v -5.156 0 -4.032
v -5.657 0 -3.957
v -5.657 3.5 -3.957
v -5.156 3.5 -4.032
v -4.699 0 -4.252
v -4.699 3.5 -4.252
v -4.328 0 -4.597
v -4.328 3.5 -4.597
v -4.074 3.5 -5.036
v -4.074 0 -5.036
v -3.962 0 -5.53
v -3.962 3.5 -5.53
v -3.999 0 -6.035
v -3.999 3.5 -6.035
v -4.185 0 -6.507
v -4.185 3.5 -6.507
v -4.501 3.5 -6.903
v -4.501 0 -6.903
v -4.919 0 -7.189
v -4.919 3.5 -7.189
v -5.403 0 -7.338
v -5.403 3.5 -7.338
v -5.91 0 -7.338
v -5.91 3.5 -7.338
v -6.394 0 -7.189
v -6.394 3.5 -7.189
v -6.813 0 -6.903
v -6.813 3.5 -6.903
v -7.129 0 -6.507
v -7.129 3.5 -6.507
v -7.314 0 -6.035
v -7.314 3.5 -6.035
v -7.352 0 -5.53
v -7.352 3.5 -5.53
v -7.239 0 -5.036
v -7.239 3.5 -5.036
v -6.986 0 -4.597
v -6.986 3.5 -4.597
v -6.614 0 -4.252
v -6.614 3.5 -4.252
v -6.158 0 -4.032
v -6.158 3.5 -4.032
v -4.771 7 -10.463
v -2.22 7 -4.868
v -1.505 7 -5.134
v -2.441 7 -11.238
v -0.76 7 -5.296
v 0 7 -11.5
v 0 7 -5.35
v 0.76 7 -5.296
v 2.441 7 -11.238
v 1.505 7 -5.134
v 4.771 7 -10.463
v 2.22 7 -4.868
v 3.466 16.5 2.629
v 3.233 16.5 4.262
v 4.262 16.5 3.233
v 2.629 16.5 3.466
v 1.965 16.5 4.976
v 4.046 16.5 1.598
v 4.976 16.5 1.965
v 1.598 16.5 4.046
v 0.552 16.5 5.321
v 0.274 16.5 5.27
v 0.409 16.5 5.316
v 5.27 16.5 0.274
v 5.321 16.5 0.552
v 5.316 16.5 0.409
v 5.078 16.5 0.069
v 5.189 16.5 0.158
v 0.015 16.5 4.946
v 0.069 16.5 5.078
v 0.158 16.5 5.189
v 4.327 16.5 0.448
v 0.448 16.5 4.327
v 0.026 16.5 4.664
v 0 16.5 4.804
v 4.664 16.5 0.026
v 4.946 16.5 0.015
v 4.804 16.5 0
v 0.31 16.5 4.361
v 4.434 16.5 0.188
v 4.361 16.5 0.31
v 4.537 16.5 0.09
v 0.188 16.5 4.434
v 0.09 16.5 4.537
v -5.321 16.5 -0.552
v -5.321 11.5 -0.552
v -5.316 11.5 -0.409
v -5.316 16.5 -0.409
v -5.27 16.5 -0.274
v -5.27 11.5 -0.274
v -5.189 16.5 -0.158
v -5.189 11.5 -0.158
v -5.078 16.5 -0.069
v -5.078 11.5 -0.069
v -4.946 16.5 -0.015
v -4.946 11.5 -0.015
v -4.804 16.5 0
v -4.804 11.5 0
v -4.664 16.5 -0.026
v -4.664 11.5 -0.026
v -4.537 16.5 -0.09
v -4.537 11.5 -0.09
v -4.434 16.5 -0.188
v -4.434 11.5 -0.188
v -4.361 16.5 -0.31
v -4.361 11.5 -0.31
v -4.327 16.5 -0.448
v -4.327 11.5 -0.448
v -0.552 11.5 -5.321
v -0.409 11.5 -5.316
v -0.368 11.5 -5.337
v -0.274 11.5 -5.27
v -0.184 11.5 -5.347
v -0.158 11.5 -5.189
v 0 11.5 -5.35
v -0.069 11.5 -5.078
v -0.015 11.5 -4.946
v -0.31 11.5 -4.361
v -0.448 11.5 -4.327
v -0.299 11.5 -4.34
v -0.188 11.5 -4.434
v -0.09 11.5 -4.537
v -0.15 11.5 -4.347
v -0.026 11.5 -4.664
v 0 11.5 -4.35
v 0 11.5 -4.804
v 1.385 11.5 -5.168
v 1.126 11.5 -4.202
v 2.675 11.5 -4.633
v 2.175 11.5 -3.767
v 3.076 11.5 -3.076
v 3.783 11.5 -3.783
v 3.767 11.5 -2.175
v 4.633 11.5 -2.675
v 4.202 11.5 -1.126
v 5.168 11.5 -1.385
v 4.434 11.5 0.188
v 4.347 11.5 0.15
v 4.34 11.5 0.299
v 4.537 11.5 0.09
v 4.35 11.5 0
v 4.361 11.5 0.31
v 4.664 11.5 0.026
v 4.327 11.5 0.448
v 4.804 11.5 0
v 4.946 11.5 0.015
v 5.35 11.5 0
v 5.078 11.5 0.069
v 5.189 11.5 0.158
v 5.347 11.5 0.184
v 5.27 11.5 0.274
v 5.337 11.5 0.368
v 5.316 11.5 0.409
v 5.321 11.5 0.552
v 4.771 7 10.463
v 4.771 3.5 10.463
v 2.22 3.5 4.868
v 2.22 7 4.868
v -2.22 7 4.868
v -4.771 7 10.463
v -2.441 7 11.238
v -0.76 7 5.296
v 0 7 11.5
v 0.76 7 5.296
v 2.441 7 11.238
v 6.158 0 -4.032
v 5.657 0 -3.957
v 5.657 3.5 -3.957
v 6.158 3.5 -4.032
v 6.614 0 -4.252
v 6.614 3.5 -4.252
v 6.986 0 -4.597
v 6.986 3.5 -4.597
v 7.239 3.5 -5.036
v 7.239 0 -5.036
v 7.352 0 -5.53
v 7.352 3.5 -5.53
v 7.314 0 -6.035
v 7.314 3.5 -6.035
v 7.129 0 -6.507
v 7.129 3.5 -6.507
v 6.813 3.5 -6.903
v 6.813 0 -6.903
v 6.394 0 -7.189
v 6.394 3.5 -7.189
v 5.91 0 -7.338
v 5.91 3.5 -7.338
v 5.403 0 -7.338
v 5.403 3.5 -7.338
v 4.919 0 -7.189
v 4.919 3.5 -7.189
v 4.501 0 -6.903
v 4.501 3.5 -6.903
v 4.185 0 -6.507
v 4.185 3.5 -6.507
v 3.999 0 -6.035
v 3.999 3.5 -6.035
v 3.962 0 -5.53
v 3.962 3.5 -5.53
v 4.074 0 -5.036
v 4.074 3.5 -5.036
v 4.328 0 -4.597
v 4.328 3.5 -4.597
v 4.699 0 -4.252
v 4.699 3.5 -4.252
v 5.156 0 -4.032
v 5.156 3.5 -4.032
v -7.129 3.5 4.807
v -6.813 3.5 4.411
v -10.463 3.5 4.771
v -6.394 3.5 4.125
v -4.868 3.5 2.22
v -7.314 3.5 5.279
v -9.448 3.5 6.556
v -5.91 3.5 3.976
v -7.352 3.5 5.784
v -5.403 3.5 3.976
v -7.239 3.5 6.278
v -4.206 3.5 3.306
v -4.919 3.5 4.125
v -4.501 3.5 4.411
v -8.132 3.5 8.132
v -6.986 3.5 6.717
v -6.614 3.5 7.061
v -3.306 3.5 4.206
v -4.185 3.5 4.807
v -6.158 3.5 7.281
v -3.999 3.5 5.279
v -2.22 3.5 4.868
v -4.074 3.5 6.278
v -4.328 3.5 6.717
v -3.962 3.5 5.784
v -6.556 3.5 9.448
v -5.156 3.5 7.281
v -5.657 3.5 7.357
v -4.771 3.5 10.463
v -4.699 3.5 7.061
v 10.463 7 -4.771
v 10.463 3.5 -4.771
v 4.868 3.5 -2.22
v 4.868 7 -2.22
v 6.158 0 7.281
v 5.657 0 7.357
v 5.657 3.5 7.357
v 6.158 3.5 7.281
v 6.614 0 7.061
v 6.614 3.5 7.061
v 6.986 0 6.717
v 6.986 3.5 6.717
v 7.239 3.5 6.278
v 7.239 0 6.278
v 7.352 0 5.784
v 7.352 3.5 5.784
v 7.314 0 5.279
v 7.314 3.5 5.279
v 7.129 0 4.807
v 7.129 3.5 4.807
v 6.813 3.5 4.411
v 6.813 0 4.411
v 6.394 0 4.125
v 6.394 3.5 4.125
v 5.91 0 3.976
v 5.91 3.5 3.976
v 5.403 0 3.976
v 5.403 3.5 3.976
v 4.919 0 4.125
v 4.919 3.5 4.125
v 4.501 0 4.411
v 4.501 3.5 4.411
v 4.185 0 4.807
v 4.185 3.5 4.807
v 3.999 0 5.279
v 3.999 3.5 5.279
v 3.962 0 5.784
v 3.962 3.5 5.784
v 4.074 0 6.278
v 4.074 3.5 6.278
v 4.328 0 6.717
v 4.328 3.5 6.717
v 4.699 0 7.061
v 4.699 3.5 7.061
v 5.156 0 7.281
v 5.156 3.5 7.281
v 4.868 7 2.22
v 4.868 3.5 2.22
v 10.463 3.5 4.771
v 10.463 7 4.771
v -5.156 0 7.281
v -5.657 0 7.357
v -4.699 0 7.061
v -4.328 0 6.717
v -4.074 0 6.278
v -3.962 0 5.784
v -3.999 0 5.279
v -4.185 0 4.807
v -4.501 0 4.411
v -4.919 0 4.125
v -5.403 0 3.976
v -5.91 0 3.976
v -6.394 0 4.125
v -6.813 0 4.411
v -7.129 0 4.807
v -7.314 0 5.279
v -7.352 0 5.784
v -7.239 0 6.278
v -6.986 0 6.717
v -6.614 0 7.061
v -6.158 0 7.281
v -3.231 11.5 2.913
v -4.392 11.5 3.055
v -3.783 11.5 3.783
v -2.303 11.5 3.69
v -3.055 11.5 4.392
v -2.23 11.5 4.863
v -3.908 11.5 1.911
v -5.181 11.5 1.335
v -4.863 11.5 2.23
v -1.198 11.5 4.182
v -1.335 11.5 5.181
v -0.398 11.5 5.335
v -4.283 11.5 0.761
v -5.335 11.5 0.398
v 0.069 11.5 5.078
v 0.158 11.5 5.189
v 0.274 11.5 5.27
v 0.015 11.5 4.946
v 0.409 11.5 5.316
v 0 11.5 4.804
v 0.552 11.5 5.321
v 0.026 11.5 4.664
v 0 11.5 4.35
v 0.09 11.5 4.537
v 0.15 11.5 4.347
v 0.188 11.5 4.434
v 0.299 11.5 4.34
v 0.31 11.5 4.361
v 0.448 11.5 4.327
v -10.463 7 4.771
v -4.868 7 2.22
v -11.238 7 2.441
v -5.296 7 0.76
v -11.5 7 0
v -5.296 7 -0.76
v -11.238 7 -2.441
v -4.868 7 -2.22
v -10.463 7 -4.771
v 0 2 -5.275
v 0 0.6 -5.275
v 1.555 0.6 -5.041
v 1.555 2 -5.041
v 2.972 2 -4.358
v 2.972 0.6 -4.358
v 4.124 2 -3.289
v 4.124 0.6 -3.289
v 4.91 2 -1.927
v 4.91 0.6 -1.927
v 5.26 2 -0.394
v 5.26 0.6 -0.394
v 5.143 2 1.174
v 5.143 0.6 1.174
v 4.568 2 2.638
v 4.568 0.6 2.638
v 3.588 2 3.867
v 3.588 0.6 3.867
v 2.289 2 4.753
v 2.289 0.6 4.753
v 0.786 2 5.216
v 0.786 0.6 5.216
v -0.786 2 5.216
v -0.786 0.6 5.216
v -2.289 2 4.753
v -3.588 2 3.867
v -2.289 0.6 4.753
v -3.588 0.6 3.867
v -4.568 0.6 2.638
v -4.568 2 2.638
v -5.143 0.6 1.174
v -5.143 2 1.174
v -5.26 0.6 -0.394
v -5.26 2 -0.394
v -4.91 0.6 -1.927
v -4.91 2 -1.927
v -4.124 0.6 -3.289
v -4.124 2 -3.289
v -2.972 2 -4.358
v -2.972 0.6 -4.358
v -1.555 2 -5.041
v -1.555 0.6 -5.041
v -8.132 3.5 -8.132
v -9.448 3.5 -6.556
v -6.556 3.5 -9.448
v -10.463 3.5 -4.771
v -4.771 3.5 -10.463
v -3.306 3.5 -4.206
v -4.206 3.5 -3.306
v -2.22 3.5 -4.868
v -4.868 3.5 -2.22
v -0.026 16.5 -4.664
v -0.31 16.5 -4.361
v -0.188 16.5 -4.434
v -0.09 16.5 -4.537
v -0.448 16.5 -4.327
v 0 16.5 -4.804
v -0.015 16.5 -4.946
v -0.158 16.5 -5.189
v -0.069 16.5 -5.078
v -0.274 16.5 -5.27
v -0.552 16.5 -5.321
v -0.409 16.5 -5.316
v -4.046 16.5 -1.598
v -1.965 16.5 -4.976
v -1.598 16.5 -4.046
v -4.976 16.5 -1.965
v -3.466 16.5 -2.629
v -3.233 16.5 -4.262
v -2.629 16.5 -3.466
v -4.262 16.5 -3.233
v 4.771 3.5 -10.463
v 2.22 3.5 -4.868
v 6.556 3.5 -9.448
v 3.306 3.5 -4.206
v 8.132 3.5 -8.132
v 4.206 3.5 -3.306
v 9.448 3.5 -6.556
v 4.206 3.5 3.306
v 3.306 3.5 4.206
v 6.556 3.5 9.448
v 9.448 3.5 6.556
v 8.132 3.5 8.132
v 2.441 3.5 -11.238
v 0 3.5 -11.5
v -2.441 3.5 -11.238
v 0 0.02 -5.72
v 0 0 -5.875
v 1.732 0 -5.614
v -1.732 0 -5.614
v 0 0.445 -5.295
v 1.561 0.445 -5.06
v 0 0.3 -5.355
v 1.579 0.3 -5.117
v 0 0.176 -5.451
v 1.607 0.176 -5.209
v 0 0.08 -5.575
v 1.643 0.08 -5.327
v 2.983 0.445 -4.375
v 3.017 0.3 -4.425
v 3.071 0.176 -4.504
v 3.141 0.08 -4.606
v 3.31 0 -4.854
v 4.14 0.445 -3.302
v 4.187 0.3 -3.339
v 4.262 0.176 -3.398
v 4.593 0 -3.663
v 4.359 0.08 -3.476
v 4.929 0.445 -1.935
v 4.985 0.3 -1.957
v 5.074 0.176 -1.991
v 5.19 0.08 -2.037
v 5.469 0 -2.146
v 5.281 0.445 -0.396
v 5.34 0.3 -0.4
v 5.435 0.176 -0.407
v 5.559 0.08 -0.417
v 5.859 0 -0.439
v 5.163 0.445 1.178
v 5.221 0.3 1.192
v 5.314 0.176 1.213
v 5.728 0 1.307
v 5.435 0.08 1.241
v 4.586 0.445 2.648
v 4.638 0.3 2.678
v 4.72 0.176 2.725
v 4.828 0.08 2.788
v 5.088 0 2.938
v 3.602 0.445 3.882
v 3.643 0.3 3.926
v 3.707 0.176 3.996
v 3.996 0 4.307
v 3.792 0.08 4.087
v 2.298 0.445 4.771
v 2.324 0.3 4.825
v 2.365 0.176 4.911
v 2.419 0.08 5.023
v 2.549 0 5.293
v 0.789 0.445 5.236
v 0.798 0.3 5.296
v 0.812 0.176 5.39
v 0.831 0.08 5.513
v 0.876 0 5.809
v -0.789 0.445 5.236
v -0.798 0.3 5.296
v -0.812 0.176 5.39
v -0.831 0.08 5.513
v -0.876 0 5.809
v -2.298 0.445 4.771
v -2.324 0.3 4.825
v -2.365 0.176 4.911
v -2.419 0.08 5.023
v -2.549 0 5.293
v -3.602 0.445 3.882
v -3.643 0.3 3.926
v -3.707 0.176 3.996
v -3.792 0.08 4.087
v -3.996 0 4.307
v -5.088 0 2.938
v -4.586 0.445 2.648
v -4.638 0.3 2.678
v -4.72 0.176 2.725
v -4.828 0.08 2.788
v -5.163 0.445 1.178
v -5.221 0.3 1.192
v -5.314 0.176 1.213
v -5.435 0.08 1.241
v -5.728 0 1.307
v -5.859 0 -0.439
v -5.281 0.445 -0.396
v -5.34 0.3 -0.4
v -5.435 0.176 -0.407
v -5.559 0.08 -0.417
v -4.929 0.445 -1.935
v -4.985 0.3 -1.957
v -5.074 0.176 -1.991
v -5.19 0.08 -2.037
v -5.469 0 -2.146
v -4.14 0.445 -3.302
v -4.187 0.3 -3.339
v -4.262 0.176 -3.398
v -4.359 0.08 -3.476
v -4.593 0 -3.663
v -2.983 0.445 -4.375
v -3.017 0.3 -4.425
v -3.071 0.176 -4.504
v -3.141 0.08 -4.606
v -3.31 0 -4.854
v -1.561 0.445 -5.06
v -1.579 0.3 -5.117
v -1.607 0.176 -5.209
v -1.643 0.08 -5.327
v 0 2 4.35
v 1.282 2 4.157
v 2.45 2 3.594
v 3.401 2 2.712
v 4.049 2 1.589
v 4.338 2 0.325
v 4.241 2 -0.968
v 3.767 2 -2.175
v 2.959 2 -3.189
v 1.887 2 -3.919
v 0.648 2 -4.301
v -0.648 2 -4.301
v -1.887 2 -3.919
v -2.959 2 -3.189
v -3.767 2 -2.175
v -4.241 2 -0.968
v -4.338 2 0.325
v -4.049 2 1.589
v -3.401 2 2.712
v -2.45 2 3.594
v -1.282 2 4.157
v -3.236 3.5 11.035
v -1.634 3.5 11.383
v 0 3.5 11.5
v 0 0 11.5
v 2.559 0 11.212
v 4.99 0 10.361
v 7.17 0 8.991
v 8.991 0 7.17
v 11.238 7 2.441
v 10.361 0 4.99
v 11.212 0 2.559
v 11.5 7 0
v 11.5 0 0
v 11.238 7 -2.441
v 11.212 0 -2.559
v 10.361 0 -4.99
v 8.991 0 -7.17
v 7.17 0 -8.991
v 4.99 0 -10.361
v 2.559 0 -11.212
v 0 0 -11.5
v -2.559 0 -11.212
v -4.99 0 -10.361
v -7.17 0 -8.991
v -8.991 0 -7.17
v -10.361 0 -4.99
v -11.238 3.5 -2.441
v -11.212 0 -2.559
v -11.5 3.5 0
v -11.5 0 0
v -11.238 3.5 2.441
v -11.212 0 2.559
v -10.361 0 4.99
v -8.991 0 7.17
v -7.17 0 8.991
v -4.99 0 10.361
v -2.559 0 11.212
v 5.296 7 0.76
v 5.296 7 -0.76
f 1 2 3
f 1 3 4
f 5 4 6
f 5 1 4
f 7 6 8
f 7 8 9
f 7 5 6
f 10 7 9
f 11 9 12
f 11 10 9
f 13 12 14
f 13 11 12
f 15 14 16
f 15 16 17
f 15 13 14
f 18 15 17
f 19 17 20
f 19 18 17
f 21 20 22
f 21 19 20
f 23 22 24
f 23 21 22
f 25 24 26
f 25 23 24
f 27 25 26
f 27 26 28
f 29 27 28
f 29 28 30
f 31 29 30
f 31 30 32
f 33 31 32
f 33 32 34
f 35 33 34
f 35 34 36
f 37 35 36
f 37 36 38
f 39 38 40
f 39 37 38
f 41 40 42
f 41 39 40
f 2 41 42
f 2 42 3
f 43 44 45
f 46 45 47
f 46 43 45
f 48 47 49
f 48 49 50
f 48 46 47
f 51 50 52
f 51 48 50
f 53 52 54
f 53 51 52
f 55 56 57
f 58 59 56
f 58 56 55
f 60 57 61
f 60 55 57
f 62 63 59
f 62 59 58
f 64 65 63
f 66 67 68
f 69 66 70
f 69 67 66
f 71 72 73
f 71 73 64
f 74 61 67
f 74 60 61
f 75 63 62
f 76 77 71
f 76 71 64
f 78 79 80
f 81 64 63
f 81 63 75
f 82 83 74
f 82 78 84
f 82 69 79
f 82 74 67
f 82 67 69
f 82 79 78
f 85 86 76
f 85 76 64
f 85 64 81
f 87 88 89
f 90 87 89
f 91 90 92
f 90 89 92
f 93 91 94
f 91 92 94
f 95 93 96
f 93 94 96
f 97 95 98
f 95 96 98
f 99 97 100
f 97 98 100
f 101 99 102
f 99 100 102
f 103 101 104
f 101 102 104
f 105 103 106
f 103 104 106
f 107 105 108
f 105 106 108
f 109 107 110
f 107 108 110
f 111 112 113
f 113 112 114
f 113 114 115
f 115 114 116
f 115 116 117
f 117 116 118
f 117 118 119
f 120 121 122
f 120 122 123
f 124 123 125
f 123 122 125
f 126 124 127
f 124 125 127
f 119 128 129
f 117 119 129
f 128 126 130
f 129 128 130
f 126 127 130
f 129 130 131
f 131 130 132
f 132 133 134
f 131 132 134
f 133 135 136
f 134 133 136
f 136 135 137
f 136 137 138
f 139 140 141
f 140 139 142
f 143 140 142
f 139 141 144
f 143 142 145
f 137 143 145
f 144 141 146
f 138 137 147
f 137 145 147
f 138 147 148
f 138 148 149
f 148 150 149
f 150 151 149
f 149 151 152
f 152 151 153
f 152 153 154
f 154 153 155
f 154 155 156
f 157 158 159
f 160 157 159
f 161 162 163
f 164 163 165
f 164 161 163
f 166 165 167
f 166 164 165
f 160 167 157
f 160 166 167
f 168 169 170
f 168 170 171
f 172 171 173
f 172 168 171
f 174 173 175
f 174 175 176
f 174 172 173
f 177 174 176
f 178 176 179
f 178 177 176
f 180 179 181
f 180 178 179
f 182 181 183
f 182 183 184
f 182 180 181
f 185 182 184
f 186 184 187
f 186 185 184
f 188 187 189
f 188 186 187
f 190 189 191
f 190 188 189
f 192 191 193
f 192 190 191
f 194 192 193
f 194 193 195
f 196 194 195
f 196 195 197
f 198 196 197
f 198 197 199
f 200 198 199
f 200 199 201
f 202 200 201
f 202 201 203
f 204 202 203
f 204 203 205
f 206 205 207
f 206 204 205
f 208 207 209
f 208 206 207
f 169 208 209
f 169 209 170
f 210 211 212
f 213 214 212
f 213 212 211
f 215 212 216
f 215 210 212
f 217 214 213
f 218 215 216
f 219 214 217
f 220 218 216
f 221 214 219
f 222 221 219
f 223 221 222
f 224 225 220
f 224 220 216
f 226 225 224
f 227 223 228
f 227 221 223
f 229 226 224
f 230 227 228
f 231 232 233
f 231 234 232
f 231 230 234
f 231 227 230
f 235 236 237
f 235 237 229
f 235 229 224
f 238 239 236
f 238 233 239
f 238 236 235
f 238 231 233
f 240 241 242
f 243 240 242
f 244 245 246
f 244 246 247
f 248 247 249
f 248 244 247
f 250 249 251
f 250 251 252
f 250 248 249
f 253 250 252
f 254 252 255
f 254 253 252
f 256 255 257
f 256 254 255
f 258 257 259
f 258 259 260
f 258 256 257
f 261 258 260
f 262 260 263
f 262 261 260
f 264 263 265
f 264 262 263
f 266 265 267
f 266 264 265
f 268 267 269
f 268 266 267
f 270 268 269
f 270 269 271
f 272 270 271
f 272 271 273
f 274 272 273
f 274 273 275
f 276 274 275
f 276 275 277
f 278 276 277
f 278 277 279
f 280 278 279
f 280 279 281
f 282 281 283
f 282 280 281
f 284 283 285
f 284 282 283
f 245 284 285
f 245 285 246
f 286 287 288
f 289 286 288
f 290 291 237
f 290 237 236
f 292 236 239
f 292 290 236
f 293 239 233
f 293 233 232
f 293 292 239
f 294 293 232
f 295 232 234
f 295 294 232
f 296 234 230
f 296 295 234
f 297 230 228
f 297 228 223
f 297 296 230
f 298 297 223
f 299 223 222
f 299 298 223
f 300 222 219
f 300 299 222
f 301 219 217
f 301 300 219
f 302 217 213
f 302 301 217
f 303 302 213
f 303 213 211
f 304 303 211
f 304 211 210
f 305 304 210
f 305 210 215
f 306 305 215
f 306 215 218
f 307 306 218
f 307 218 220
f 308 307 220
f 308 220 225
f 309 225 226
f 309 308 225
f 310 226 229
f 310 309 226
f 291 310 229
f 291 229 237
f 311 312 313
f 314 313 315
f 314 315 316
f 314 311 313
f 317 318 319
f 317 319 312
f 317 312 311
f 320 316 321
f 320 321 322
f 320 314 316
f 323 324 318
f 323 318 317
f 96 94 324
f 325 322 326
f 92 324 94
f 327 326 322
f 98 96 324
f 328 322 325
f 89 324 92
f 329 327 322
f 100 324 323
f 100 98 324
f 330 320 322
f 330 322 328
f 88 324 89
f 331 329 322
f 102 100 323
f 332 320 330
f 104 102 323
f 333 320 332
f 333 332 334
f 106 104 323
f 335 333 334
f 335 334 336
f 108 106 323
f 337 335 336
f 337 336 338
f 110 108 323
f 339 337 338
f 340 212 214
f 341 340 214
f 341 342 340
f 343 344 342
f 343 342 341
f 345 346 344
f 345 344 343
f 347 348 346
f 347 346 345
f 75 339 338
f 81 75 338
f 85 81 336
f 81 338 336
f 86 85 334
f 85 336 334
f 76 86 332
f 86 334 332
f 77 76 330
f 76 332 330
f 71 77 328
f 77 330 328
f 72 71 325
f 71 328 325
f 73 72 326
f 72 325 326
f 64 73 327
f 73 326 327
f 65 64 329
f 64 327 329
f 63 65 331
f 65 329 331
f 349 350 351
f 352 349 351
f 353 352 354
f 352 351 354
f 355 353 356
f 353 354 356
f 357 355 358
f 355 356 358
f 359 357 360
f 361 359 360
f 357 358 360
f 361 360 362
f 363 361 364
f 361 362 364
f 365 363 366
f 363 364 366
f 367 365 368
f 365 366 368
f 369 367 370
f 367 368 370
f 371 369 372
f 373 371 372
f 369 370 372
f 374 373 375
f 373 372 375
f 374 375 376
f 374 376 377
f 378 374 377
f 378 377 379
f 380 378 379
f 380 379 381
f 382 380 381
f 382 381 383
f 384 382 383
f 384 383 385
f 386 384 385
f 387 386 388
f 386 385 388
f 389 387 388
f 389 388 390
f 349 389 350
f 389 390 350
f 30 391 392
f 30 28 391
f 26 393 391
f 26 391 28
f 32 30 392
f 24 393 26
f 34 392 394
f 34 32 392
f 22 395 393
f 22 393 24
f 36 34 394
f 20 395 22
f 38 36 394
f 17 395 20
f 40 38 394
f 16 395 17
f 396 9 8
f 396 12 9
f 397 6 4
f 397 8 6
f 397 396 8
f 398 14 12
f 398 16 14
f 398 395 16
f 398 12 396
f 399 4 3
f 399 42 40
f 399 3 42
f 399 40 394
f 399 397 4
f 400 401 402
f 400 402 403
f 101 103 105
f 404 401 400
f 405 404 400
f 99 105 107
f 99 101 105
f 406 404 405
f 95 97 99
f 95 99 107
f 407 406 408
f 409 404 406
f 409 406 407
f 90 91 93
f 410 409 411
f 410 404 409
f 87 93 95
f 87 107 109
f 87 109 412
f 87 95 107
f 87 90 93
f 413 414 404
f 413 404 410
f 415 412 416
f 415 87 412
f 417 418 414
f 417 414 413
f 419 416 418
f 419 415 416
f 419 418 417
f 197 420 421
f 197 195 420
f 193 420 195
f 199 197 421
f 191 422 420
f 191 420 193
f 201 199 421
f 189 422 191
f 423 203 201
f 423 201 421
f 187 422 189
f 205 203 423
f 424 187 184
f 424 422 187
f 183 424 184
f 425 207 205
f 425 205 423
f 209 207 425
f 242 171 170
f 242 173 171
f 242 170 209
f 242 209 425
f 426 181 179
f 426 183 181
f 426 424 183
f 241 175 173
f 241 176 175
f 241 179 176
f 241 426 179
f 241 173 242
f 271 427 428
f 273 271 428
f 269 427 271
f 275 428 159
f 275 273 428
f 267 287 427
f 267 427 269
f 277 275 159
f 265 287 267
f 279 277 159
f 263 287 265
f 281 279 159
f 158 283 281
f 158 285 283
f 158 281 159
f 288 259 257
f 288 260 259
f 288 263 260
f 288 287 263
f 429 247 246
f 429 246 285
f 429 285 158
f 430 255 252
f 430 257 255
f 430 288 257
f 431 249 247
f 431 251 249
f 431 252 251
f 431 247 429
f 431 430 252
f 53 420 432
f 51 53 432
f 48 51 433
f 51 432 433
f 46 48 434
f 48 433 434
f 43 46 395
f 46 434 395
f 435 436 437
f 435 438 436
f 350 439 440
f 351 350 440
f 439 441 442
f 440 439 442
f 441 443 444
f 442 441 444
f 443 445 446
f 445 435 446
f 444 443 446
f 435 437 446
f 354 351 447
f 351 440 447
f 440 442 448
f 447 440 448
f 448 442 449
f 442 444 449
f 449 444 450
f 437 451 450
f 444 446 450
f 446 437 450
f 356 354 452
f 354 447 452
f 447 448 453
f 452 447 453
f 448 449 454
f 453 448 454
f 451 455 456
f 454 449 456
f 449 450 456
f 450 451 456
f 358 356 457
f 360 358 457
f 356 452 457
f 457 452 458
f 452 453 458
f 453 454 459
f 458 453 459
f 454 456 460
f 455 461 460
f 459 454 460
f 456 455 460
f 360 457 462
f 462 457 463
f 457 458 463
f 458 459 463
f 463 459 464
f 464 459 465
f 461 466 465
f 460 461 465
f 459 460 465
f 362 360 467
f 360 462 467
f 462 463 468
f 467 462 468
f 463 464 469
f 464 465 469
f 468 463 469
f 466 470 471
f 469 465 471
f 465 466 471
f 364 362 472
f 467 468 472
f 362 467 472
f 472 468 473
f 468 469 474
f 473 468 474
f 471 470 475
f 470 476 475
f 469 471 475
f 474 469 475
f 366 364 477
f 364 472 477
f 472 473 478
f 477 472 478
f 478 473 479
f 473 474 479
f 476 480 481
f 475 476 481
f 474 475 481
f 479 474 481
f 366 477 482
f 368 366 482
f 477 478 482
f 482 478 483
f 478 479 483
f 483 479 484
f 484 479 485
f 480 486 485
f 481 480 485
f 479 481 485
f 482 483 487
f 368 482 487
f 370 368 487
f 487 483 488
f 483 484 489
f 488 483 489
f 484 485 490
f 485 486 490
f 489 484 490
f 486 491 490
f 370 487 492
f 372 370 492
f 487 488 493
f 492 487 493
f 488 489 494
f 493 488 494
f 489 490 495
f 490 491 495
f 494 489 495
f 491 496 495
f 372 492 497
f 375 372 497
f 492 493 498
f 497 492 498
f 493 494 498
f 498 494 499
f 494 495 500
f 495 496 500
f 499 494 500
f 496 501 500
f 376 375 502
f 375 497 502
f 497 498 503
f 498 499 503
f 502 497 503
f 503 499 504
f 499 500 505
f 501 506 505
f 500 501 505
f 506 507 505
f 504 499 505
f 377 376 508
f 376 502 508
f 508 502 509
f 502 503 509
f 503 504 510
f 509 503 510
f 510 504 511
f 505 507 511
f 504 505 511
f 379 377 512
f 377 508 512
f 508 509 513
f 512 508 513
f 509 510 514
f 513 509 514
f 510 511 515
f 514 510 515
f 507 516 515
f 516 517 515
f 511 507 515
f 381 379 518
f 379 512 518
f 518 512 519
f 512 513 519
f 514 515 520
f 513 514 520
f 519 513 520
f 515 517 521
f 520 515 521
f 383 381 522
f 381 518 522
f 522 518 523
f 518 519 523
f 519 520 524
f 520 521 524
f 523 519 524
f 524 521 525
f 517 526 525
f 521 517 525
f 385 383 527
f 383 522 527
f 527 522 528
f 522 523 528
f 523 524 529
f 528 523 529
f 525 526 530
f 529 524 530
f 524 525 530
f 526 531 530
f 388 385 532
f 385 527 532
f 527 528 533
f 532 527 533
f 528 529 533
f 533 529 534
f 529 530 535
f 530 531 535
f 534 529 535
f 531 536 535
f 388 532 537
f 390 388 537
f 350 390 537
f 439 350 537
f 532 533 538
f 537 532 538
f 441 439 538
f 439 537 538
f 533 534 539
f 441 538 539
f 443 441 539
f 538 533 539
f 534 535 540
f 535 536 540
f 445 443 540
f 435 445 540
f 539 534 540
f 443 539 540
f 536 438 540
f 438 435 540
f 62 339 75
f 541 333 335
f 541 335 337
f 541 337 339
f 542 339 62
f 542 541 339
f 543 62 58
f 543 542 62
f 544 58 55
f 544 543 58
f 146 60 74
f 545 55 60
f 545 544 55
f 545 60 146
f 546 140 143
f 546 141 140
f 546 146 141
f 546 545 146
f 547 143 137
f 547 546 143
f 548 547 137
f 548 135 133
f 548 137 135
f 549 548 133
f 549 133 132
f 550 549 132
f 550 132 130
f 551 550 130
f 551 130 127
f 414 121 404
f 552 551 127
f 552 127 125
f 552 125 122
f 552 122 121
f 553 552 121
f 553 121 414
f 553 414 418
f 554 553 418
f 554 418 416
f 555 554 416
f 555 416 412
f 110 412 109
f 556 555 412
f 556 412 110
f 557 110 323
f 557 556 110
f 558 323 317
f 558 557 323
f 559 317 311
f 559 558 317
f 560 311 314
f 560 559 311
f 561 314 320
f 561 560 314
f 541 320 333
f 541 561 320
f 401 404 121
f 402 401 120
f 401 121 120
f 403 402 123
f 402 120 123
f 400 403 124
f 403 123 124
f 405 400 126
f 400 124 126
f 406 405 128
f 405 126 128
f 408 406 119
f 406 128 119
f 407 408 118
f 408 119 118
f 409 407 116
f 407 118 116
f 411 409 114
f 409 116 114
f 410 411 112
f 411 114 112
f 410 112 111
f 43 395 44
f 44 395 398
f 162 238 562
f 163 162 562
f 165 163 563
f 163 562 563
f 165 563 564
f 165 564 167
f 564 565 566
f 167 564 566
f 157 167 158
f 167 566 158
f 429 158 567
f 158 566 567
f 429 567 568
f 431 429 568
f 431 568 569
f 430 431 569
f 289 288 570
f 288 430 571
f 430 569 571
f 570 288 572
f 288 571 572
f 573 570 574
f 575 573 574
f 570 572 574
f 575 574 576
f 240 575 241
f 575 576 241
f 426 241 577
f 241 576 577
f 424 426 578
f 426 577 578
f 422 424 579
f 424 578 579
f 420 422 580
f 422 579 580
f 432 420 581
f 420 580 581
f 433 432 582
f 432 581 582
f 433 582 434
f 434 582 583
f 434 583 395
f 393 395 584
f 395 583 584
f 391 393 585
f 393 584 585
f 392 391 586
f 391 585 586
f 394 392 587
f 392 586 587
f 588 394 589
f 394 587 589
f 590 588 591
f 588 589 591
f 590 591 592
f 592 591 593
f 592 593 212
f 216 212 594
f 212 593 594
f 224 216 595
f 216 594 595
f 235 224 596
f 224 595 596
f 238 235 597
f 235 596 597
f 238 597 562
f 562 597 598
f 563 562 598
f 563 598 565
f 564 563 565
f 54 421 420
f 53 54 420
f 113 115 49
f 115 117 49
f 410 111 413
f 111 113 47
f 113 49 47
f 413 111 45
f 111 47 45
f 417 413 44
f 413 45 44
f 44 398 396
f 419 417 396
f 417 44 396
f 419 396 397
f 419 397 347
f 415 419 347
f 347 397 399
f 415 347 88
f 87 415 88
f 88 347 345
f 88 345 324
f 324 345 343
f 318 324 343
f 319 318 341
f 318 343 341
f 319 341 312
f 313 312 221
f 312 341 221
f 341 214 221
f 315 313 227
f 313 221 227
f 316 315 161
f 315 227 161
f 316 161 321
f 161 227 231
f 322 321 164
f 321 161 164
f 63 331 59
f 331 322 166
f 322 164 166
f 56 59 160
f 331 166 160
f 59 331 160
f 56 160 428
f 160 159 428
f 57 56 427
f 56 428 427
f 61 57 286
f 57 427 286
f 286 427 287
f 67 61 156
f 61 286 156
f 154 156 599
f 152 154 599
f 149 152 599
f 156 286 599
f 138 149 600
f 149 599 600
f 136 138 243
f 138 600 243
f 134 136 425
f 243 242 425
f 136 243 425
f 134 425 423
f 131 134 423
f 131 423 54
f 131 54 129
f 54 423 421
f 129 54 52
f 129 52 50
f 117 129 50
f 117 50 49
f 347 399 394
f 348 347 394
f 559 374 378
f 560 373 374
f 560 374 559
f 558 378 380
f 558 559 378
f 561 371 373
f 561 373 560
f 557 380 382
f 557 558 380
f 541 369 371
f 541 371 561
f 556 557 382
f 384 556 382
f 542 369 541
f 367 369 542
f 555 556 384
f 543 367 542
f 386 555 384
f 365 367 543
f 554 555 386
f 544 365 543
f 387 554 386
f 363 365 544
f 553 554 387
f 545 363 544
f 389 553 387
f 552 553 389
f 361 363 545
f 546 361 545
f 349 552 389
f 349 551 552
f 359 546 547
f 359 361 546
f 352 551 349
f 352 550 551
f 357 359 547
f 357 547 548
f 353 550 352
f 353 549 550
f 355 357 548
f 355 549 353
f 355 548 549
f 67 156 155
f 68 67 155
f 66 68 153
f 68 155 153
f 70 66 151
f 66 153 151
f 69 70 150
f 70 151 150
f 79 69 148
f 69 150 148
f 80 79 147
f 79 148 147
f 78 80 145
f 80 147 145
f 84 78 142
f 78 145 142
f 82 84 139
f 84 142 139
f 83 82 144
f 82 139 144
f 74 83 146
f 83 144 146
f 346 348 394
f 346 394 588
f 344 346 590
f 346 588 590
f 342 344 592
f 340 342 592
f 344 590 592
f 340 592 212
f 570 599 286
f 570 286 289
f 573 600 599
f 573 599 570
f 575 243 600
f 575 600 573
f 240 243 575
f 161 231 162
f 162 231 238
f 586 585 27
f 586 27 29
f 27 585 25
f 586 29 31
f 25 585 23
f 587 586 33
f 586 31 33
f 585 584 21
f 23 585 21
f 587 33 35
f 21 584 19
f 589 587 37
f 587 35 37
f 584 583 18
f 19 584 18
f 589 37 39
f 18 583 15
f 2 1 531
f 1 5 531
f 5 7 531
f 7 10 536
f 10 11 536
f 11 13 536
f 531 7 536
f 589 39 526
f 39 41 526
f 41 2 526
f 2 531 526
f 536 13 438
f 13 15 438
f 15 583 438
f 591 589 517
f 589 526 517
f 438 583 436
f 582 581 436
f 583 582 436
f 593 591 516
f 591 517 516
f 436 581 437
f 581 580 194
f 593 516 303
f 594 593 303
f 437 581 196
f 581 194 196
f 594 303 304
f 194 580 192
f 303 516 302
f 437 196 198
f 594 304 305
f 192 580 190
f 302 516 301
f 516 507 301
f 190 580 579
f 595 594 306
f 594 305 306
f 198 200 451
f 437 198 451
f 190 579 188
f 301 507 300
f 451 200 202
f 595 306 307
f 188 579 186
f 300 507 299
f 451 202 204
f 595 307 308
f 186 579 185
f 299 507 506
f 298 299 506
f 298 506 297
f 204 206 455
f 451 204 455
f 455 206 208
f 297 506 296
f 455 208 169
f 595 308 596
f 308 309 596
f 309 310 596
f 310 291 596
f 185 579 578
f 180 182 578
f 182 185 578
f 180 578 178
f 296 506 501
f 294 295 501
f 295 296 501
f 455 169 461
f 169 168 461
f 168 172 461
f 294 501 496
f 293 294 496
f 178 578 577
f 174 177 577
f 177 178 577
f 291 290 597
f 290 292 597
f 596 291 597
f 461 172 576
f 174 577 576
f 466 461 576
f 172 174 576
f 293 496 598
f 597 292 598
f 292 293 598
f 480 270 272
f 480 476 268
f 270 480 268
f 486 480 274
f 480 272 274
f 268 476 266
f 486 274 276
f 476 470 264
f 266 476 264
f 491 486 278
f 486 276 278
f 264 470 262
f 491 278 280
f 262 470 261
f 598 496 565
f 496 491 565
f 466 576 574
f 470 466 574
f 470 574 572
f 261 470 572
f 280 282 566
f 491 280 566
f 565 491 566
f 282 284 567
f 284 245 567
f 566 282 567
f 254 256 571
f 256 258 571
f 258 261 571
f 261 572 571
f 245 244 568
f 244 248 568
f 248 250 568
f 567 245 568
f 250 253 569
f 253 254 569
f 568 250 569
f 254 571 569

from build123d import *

# Parameters (mm, degrees)
CROQUIS1_R              = 11.5
CROQUIS1_R_2            = 4.35
CROQUIS1_R_3            = 1.7000000000000004
SALIENTE_EXTRUIR1_DEPTH = 3.5
CROQUIS2_R              = 5.35
CROQUIS2_R_2            = 4.35
SALIENTE_EXTRUIR2_DEPTH = 13
CORTAR_EXTRUIR1_START   = -5
CORTAR_EXTRUIR1_DEPTH   = 5
CROQUIS4_R              = 5.275
CROQUIS4_R_2            = 4.35
CORTAR_EXTRUIR2_DEPTH   = 2
REDONDEO1_R             = 0.6
REDONDEO2_R             = 0.5
SALIENTE_EXTRUIR3_DEPTH = 3.5


with BuildPart() as part:
    # Croquis1 → Saliente-Extruir1 (new body)
    with BuildSketch(Plane(origin=(0, 0, 0), x_dir=(1, 0, 0), z_dir=(0, 1, 0))):
        with Locations(Location((1.731948e-11, 0, 0), (0, 0, 270))):
            Circle(CROQUIS1_R)
        with Locations(Location((1.731948e-11, 0, 0), (0, 0, 270))):
            Circle(CROQUIS1_R_2, mode=Mode.SUBTRACT)
        with Locations(Location((5.656854249492441, 5.65685424949238, 0), (0, 0, 270))):
            Circle(CROQUIS1_R_3, mode=Mode.SUBTRACT)
        with Locations(Location((-5.656854249492318, 5.656854249492381, 0), (0, 0, 270))):
            Circle(CROQUIS1_R_3, mode=Mode.SUBTRACT)
        with Locations(Location((-5.656854249492318, -5.656854249492381, 0), (0, 0, 270))):
            Circle(CROQUIS1_R_3, mode=Mode.SUBTRACT)
        with Locations(Location((5.656854249492441, -5.65685424949238, 0), (0, 0, 270))):
            Circle(CROQUIS1_R_3, mode=Mode.SUBTRACT)
    extrude(amount=SALIENTE_EXTRUIR1_DEPTH)

    # Croquis2 → Saliente-Extruir2 (add)
    with BuildSketch(Plane(origin=(0, 3.5, 0), x_dir=(1, 0, 0), z_dir=(0, 1, 0))):
        with Locations(Location((1.731948e-11, 0, 0), (0, 0, 90))):
            Circle(CROQUIS2_R)
        with Locations(Location((1.731948e-11, 0, 0), (0, 0, 270))):
            Circle(CROQUIS2_R_2, mode=Mode.SUBTRACT)
    extrude(amount=SALIENTE_EXTRUIR2_DEPTH)

    # Croquis3 → Cortar-Extruir1 (cut)
    with BuildSketch(Plane(origin=(0, 16.5, 0), x_dir=(1, 0, 0), z_dir=(0, 1, 0)).offset(CORTAR_EXTRUIR1_START)):
        with BuildLine():
            Line((1.732086e-11, 5.35), (1.732072e-11, 4.35))
            ThreePointArc((1.732072e-11, 4.35), (3.0759144981543076, 3.0759144981369877), (4.34999999998268, 0))
            Line((4.34999999998268, 0), (5.34999999998268, 0))
            ThreePointArc((5.34999999998268, 0), (3.783021279340855, 3.783021279323535), (1.732086e-11, 5.35))
        make_face()
        with BuildLine():
            Line((1.732086e-11, -5.35), (1.732072e-11, -4.35))
            ThreePointArc((1.732072e-11, -4.35), (-3.075914498144163, -3.075914498161481), (-4.34999999998268, 0))
            Line((-4.34999999998268, 0), (-5.34999999998268, 0))
            ThreePointArc((-5.34999999998268, 0), (-3.7830212793307103, -3.7830212793480285), (1.732086e-11, -5.35))
        make_face()
    extrude(amount=CORTAR_EXTRUIR1_DEPTH, mode=Mode.SUBTRACT)

    # Croquis4 → Cortar-Extruir2 (cut)
    with BuildSketch(Plane.XZ):
        with Locations(Location((1.731948e-11, 0, 0), (0, 0, 270))):
            Circle(CROQUIS4_R)
        with Locations(Location((1.731948e-11, 0, 0), (0, 0, 270))):
            Circle(CROQUIS4_R_2, mode=Mode.SUBTRACT)
    extrude(amount=-CORTAR_EXTRUIR2_DEPTH, mode=Mode.SUBTRACT)

    # Redondeo1
    redondeo1_edges = [part.edges().sort_by_distance(p)[0] for p in [
        (1.732109e-11, 0, 5.275),
    ]]
    fillet(redondeo1_edges, radius=REDONDEO1_R)

    # Redondeo2
    # the kernel refuses this fillet: 0.5 mm, written as the material it takes off along each edge
    with BuildSketch(Plane(origin=(-4.34999999998268, 11.5, -2.1e-16), x_dir=(0.05161519234821224, 0, -0.9986670475783493), z_dir=(0, 1, 0))) as redondeo2_piece_1:
        with BuildLine():
            CenterArc((0.4748597696035476, 0.49933352378917434), REDONDEO2_R, 182.9586473758917, 84.08270524821648)
            Line((-0.02447375418562714, 0.4735259276150691), (0, 0))
            ThreePointArc((0, 0), (0.22452608671472166, 0.00579834303418057), (0.44905217342944187, 0))
        make_face()
    extrude(amount=6.185394894032285, mode=Mode.SUBTRACT)
    with BuildSketch(Plane(origin=(-5.34999999998268, 11.5, 0), x_dir=(1, 0, 0), z_dir=(0, 1, 0))) as redondeo2_piece_2:
        with BuildLine():
            CenterArc((0.5258420423870858, 0.5), REDONDEO2_R, 174.0827052482164, 95.91729475178363)
            ThreePointArc((0.02850617046822901, 0.5515463917525775), (0.00713129545583069, 0.2761412790629337), (0, 0))
            Line((0, 0), (0.5258420423870858, 0))
        make_face()
    extrude(amount=6.380706395314668, mode=Mode.SUBTRACT)
    with BuildSketch(Plane(origin=(1.7321e-11, 11.5, 5.35), x_dir=(-3.5e-16, 0, -1), z_dir=(0, 1, 0))) as redondeo2_piece_3:
        with BuildLine():
            CenterArc((0.5258420423870855, -0.5), REDONDEO2_R, 89.99999999999997, 95.91729475178352)
            ThreePointArc((0.02850617046822881, -0.5515463917525766), (0.00713129545583059, -0.27614127906293173), (0, 0))
            Line((0, 0), (0.5258420423870858, 0))
        make_face()
    extrude(amount=6.3807063953146645, mode=Mode.SUBTRACT)
    with BuildSketch(Plane(origin=(1.731868e-11, 11.5, 4.35), x_dir=(0.9986670475783493, 0, -0.051615192348211894), z_dir=(0, 1, 0))) as redondeo2_piece_4:
        with BuildLine():
            CenterArc((0.474859769603551, -0.49933352378917434), REDONDEO2_R, 92.95864737589183, 84.08270524821639)
            Line((-0.0244737541856237, -0.4735259276150684), (0, 0))
            ThreePointArc((0, 0), (0.2245260867147224, -0.00579834303418053), (0.4490521734294448, 0))
        make_face()
    extrude(amount=6.185394894032285, mode=Mode.SUBTRACT)
    with BuildSketch(Plane(origin=(1.732072e-11, 11.5, -4.35), x_dir=(-0.9986670475783493, 0, 0.05161519234821218), z_dir=(0, 1, 0))) as redondeo2_piece_5:
        with BuildLine():
            CenterArc((0.474859769603548, -0.49933352378917434), REDONDEO2_R, 92.95864737589177, 84.08270524821641)
            Line((-0.02447375418562666, -0.47352592761506823), (0, 0))
            ThreePointArc((0, 0), (0.22452608671472019, -0.00579834303418048), (0.4490521734294423, 0))
        make_face()
    extrude(amount=6.185394894032285, mode=Mode.SUBTRACT)
    with BuildSketch(Plane(origin=(1.731981e-11, 11.5, -5.35), x_dir=(1.91e-15, 0, 1), z_dir=(0, 1, 0))) as redondeo2_piece_6:
        with BuildLine():
            CenterArc((0.5258420423870848, -0.5), REDONDEO2_R, 89.99999999999989, 95.91729475178357)
            ThreePointArc((0.02850617046822795, -0.5515463917525762), (0.00713129545583016, -0.2761412790629328), (0, 0))
            Line((0, 0), (0.5258420423870858, 0))
        make_face()
    extrude(amount=6.3807063953146645, mode=Mode.SUBTRACT)
    with BuildSketch(Plane(origin=(4.34999999998268, 11.5, 1.9e-16), x_dir=(-0.05161519227127975, 0, 0.9986670475823255), z_dir=(0, 1, 0))) as redondeo2_piece_7:
        with BuildLine():
            CenterArc((0.47485976964022647, 0.4993335237871862), REDONDEO2_R, 182.95864737147792, 84.08270524821648)
            Line((-0.02447375415093636, 0.4735259276515472), (0, 0))
            ThreePointArc((0, 0), (0.22452608671427532, 0.00579834305147695), (0.44905217342765447, 0))
        make_face()
    extrude(amount=6.1853948941188825, mode=Mode.SUBTRACT)
    with BuildSketch(Plane(origin=(5.34999999998268, 11.5, 0), x_dir=(-1, 0, 0), z_dir=(0, 1, 0))) as redondeo2_piece_8:
        with BuildLine():
            CenterArc((0.5258420423524468, 0.5), REDONDEO2_R, 174.08270524821663, 95.9172947517834)
            ThreePointArc((0.02850617043358916, 0.5515463917525757), (0.00713129542123792, 0.2761412790638253), (0, 0))
            Line((0, 0), (0.5258420423524468, 0))
        make_face()
    extrude(amount=6.380706395310192, mode=Mode.SUBTRACT)

    # Croquis5 → Saliente-Extruir3 (add)
    with BuildSketch(Plane(origin=(0, 3.5, 0), x_dir=(1, 0, 0), z_dir=(0, 1, 0))):
        with BuildLine():
            Line((-4.867801495370659, 2.219686599837588), (-10.46349854147086, 4.7712889529219185))
            ThreePointArc((-10.46349854147086, 4.7712889529219185), (-11.49999999998268, 1.41e-15), (-10.46349854147086, -4.771288952921916))
            Line((-10.46349854147086, -4.771288952921914), (-4.86780149537066, -2.219686599837586))
            ThreePointArc((-4.86780149537066, -2.219686599837586), (-5.34999999998268, 8.9e-16), (-4.86780149537066, 2.219686599837588))
        make_face()
        with BuildLine():
            Line((-2.2196865998351183, -4.867801495381207), (-4.77128895293652, -10.463498541473625))
            ThreePointArc((-4.771288952936522, -10.463498541473623), (-6.77758e-12, -11.5), (4.771288952927311, -10.463498541493617))
            Line((4.771288952927309, -10.46349854149362), (2.2196865998493576, -4.86780149539051))
            ThreePointArc((2.219686599849358, -4.867801495390509), (6.10956e-12, -5.35), (-2.219686599835118, -4.867801495381206))
        make_face()
        with BuildLine():
            ThreePointArc((11.50000000001732, 0), (11.237887551221265, 2.4412872396535783), (10.463498541496383, 4.771288952941911))
            Line((10.463498541496381, 4.7712889529419105), (4.867801495401058, 2.2196865998468893))
            ThreePointArc((4.867801495401059, 2.2196865998468898), (5.228060730360026, 1.1357292810562294), (5.350000000017321, -1.1e-16))
            ThreePointArc((5.350000000017321, -1.1e-16), (5.228060730360026, -1.1357292810562303), (4.867801495401057, -2.2196865998468898))
            Line((4.867801495401058, -2.2196865998468898), (10.463498541496381, -4.771288952941912))
            ThreePointArc((10.463498541496378, -4.7712889529419185), (11.237887551221265, -2.4412872396535787), (11.50000000001732, -2.82e-15))
        make_face()
        with BuildLine():
            ThreePointArc((4.771288952927309, 10.46349854149362), (-6.77732e-12, 11.5), (-4.771288952936519, 10.463498541473625))
            Line((-4.771288952936519, 10.463498541473623), (-2.2196865998351187, 4.867801495381207))
            ThreePointArc((-2.219686599835118, 4.867801495381207), (6.10867e-12, 5.35), (2.219686599849357, 4.86780149539051))
            Line((2.2196865998493576, 4.86780149539051), (4.771288952927309, 10.46349854149362))
        make_face()
    extrude(amount=SALIENTE_EXTRUIR3_DEPTH)


solid = part.part
